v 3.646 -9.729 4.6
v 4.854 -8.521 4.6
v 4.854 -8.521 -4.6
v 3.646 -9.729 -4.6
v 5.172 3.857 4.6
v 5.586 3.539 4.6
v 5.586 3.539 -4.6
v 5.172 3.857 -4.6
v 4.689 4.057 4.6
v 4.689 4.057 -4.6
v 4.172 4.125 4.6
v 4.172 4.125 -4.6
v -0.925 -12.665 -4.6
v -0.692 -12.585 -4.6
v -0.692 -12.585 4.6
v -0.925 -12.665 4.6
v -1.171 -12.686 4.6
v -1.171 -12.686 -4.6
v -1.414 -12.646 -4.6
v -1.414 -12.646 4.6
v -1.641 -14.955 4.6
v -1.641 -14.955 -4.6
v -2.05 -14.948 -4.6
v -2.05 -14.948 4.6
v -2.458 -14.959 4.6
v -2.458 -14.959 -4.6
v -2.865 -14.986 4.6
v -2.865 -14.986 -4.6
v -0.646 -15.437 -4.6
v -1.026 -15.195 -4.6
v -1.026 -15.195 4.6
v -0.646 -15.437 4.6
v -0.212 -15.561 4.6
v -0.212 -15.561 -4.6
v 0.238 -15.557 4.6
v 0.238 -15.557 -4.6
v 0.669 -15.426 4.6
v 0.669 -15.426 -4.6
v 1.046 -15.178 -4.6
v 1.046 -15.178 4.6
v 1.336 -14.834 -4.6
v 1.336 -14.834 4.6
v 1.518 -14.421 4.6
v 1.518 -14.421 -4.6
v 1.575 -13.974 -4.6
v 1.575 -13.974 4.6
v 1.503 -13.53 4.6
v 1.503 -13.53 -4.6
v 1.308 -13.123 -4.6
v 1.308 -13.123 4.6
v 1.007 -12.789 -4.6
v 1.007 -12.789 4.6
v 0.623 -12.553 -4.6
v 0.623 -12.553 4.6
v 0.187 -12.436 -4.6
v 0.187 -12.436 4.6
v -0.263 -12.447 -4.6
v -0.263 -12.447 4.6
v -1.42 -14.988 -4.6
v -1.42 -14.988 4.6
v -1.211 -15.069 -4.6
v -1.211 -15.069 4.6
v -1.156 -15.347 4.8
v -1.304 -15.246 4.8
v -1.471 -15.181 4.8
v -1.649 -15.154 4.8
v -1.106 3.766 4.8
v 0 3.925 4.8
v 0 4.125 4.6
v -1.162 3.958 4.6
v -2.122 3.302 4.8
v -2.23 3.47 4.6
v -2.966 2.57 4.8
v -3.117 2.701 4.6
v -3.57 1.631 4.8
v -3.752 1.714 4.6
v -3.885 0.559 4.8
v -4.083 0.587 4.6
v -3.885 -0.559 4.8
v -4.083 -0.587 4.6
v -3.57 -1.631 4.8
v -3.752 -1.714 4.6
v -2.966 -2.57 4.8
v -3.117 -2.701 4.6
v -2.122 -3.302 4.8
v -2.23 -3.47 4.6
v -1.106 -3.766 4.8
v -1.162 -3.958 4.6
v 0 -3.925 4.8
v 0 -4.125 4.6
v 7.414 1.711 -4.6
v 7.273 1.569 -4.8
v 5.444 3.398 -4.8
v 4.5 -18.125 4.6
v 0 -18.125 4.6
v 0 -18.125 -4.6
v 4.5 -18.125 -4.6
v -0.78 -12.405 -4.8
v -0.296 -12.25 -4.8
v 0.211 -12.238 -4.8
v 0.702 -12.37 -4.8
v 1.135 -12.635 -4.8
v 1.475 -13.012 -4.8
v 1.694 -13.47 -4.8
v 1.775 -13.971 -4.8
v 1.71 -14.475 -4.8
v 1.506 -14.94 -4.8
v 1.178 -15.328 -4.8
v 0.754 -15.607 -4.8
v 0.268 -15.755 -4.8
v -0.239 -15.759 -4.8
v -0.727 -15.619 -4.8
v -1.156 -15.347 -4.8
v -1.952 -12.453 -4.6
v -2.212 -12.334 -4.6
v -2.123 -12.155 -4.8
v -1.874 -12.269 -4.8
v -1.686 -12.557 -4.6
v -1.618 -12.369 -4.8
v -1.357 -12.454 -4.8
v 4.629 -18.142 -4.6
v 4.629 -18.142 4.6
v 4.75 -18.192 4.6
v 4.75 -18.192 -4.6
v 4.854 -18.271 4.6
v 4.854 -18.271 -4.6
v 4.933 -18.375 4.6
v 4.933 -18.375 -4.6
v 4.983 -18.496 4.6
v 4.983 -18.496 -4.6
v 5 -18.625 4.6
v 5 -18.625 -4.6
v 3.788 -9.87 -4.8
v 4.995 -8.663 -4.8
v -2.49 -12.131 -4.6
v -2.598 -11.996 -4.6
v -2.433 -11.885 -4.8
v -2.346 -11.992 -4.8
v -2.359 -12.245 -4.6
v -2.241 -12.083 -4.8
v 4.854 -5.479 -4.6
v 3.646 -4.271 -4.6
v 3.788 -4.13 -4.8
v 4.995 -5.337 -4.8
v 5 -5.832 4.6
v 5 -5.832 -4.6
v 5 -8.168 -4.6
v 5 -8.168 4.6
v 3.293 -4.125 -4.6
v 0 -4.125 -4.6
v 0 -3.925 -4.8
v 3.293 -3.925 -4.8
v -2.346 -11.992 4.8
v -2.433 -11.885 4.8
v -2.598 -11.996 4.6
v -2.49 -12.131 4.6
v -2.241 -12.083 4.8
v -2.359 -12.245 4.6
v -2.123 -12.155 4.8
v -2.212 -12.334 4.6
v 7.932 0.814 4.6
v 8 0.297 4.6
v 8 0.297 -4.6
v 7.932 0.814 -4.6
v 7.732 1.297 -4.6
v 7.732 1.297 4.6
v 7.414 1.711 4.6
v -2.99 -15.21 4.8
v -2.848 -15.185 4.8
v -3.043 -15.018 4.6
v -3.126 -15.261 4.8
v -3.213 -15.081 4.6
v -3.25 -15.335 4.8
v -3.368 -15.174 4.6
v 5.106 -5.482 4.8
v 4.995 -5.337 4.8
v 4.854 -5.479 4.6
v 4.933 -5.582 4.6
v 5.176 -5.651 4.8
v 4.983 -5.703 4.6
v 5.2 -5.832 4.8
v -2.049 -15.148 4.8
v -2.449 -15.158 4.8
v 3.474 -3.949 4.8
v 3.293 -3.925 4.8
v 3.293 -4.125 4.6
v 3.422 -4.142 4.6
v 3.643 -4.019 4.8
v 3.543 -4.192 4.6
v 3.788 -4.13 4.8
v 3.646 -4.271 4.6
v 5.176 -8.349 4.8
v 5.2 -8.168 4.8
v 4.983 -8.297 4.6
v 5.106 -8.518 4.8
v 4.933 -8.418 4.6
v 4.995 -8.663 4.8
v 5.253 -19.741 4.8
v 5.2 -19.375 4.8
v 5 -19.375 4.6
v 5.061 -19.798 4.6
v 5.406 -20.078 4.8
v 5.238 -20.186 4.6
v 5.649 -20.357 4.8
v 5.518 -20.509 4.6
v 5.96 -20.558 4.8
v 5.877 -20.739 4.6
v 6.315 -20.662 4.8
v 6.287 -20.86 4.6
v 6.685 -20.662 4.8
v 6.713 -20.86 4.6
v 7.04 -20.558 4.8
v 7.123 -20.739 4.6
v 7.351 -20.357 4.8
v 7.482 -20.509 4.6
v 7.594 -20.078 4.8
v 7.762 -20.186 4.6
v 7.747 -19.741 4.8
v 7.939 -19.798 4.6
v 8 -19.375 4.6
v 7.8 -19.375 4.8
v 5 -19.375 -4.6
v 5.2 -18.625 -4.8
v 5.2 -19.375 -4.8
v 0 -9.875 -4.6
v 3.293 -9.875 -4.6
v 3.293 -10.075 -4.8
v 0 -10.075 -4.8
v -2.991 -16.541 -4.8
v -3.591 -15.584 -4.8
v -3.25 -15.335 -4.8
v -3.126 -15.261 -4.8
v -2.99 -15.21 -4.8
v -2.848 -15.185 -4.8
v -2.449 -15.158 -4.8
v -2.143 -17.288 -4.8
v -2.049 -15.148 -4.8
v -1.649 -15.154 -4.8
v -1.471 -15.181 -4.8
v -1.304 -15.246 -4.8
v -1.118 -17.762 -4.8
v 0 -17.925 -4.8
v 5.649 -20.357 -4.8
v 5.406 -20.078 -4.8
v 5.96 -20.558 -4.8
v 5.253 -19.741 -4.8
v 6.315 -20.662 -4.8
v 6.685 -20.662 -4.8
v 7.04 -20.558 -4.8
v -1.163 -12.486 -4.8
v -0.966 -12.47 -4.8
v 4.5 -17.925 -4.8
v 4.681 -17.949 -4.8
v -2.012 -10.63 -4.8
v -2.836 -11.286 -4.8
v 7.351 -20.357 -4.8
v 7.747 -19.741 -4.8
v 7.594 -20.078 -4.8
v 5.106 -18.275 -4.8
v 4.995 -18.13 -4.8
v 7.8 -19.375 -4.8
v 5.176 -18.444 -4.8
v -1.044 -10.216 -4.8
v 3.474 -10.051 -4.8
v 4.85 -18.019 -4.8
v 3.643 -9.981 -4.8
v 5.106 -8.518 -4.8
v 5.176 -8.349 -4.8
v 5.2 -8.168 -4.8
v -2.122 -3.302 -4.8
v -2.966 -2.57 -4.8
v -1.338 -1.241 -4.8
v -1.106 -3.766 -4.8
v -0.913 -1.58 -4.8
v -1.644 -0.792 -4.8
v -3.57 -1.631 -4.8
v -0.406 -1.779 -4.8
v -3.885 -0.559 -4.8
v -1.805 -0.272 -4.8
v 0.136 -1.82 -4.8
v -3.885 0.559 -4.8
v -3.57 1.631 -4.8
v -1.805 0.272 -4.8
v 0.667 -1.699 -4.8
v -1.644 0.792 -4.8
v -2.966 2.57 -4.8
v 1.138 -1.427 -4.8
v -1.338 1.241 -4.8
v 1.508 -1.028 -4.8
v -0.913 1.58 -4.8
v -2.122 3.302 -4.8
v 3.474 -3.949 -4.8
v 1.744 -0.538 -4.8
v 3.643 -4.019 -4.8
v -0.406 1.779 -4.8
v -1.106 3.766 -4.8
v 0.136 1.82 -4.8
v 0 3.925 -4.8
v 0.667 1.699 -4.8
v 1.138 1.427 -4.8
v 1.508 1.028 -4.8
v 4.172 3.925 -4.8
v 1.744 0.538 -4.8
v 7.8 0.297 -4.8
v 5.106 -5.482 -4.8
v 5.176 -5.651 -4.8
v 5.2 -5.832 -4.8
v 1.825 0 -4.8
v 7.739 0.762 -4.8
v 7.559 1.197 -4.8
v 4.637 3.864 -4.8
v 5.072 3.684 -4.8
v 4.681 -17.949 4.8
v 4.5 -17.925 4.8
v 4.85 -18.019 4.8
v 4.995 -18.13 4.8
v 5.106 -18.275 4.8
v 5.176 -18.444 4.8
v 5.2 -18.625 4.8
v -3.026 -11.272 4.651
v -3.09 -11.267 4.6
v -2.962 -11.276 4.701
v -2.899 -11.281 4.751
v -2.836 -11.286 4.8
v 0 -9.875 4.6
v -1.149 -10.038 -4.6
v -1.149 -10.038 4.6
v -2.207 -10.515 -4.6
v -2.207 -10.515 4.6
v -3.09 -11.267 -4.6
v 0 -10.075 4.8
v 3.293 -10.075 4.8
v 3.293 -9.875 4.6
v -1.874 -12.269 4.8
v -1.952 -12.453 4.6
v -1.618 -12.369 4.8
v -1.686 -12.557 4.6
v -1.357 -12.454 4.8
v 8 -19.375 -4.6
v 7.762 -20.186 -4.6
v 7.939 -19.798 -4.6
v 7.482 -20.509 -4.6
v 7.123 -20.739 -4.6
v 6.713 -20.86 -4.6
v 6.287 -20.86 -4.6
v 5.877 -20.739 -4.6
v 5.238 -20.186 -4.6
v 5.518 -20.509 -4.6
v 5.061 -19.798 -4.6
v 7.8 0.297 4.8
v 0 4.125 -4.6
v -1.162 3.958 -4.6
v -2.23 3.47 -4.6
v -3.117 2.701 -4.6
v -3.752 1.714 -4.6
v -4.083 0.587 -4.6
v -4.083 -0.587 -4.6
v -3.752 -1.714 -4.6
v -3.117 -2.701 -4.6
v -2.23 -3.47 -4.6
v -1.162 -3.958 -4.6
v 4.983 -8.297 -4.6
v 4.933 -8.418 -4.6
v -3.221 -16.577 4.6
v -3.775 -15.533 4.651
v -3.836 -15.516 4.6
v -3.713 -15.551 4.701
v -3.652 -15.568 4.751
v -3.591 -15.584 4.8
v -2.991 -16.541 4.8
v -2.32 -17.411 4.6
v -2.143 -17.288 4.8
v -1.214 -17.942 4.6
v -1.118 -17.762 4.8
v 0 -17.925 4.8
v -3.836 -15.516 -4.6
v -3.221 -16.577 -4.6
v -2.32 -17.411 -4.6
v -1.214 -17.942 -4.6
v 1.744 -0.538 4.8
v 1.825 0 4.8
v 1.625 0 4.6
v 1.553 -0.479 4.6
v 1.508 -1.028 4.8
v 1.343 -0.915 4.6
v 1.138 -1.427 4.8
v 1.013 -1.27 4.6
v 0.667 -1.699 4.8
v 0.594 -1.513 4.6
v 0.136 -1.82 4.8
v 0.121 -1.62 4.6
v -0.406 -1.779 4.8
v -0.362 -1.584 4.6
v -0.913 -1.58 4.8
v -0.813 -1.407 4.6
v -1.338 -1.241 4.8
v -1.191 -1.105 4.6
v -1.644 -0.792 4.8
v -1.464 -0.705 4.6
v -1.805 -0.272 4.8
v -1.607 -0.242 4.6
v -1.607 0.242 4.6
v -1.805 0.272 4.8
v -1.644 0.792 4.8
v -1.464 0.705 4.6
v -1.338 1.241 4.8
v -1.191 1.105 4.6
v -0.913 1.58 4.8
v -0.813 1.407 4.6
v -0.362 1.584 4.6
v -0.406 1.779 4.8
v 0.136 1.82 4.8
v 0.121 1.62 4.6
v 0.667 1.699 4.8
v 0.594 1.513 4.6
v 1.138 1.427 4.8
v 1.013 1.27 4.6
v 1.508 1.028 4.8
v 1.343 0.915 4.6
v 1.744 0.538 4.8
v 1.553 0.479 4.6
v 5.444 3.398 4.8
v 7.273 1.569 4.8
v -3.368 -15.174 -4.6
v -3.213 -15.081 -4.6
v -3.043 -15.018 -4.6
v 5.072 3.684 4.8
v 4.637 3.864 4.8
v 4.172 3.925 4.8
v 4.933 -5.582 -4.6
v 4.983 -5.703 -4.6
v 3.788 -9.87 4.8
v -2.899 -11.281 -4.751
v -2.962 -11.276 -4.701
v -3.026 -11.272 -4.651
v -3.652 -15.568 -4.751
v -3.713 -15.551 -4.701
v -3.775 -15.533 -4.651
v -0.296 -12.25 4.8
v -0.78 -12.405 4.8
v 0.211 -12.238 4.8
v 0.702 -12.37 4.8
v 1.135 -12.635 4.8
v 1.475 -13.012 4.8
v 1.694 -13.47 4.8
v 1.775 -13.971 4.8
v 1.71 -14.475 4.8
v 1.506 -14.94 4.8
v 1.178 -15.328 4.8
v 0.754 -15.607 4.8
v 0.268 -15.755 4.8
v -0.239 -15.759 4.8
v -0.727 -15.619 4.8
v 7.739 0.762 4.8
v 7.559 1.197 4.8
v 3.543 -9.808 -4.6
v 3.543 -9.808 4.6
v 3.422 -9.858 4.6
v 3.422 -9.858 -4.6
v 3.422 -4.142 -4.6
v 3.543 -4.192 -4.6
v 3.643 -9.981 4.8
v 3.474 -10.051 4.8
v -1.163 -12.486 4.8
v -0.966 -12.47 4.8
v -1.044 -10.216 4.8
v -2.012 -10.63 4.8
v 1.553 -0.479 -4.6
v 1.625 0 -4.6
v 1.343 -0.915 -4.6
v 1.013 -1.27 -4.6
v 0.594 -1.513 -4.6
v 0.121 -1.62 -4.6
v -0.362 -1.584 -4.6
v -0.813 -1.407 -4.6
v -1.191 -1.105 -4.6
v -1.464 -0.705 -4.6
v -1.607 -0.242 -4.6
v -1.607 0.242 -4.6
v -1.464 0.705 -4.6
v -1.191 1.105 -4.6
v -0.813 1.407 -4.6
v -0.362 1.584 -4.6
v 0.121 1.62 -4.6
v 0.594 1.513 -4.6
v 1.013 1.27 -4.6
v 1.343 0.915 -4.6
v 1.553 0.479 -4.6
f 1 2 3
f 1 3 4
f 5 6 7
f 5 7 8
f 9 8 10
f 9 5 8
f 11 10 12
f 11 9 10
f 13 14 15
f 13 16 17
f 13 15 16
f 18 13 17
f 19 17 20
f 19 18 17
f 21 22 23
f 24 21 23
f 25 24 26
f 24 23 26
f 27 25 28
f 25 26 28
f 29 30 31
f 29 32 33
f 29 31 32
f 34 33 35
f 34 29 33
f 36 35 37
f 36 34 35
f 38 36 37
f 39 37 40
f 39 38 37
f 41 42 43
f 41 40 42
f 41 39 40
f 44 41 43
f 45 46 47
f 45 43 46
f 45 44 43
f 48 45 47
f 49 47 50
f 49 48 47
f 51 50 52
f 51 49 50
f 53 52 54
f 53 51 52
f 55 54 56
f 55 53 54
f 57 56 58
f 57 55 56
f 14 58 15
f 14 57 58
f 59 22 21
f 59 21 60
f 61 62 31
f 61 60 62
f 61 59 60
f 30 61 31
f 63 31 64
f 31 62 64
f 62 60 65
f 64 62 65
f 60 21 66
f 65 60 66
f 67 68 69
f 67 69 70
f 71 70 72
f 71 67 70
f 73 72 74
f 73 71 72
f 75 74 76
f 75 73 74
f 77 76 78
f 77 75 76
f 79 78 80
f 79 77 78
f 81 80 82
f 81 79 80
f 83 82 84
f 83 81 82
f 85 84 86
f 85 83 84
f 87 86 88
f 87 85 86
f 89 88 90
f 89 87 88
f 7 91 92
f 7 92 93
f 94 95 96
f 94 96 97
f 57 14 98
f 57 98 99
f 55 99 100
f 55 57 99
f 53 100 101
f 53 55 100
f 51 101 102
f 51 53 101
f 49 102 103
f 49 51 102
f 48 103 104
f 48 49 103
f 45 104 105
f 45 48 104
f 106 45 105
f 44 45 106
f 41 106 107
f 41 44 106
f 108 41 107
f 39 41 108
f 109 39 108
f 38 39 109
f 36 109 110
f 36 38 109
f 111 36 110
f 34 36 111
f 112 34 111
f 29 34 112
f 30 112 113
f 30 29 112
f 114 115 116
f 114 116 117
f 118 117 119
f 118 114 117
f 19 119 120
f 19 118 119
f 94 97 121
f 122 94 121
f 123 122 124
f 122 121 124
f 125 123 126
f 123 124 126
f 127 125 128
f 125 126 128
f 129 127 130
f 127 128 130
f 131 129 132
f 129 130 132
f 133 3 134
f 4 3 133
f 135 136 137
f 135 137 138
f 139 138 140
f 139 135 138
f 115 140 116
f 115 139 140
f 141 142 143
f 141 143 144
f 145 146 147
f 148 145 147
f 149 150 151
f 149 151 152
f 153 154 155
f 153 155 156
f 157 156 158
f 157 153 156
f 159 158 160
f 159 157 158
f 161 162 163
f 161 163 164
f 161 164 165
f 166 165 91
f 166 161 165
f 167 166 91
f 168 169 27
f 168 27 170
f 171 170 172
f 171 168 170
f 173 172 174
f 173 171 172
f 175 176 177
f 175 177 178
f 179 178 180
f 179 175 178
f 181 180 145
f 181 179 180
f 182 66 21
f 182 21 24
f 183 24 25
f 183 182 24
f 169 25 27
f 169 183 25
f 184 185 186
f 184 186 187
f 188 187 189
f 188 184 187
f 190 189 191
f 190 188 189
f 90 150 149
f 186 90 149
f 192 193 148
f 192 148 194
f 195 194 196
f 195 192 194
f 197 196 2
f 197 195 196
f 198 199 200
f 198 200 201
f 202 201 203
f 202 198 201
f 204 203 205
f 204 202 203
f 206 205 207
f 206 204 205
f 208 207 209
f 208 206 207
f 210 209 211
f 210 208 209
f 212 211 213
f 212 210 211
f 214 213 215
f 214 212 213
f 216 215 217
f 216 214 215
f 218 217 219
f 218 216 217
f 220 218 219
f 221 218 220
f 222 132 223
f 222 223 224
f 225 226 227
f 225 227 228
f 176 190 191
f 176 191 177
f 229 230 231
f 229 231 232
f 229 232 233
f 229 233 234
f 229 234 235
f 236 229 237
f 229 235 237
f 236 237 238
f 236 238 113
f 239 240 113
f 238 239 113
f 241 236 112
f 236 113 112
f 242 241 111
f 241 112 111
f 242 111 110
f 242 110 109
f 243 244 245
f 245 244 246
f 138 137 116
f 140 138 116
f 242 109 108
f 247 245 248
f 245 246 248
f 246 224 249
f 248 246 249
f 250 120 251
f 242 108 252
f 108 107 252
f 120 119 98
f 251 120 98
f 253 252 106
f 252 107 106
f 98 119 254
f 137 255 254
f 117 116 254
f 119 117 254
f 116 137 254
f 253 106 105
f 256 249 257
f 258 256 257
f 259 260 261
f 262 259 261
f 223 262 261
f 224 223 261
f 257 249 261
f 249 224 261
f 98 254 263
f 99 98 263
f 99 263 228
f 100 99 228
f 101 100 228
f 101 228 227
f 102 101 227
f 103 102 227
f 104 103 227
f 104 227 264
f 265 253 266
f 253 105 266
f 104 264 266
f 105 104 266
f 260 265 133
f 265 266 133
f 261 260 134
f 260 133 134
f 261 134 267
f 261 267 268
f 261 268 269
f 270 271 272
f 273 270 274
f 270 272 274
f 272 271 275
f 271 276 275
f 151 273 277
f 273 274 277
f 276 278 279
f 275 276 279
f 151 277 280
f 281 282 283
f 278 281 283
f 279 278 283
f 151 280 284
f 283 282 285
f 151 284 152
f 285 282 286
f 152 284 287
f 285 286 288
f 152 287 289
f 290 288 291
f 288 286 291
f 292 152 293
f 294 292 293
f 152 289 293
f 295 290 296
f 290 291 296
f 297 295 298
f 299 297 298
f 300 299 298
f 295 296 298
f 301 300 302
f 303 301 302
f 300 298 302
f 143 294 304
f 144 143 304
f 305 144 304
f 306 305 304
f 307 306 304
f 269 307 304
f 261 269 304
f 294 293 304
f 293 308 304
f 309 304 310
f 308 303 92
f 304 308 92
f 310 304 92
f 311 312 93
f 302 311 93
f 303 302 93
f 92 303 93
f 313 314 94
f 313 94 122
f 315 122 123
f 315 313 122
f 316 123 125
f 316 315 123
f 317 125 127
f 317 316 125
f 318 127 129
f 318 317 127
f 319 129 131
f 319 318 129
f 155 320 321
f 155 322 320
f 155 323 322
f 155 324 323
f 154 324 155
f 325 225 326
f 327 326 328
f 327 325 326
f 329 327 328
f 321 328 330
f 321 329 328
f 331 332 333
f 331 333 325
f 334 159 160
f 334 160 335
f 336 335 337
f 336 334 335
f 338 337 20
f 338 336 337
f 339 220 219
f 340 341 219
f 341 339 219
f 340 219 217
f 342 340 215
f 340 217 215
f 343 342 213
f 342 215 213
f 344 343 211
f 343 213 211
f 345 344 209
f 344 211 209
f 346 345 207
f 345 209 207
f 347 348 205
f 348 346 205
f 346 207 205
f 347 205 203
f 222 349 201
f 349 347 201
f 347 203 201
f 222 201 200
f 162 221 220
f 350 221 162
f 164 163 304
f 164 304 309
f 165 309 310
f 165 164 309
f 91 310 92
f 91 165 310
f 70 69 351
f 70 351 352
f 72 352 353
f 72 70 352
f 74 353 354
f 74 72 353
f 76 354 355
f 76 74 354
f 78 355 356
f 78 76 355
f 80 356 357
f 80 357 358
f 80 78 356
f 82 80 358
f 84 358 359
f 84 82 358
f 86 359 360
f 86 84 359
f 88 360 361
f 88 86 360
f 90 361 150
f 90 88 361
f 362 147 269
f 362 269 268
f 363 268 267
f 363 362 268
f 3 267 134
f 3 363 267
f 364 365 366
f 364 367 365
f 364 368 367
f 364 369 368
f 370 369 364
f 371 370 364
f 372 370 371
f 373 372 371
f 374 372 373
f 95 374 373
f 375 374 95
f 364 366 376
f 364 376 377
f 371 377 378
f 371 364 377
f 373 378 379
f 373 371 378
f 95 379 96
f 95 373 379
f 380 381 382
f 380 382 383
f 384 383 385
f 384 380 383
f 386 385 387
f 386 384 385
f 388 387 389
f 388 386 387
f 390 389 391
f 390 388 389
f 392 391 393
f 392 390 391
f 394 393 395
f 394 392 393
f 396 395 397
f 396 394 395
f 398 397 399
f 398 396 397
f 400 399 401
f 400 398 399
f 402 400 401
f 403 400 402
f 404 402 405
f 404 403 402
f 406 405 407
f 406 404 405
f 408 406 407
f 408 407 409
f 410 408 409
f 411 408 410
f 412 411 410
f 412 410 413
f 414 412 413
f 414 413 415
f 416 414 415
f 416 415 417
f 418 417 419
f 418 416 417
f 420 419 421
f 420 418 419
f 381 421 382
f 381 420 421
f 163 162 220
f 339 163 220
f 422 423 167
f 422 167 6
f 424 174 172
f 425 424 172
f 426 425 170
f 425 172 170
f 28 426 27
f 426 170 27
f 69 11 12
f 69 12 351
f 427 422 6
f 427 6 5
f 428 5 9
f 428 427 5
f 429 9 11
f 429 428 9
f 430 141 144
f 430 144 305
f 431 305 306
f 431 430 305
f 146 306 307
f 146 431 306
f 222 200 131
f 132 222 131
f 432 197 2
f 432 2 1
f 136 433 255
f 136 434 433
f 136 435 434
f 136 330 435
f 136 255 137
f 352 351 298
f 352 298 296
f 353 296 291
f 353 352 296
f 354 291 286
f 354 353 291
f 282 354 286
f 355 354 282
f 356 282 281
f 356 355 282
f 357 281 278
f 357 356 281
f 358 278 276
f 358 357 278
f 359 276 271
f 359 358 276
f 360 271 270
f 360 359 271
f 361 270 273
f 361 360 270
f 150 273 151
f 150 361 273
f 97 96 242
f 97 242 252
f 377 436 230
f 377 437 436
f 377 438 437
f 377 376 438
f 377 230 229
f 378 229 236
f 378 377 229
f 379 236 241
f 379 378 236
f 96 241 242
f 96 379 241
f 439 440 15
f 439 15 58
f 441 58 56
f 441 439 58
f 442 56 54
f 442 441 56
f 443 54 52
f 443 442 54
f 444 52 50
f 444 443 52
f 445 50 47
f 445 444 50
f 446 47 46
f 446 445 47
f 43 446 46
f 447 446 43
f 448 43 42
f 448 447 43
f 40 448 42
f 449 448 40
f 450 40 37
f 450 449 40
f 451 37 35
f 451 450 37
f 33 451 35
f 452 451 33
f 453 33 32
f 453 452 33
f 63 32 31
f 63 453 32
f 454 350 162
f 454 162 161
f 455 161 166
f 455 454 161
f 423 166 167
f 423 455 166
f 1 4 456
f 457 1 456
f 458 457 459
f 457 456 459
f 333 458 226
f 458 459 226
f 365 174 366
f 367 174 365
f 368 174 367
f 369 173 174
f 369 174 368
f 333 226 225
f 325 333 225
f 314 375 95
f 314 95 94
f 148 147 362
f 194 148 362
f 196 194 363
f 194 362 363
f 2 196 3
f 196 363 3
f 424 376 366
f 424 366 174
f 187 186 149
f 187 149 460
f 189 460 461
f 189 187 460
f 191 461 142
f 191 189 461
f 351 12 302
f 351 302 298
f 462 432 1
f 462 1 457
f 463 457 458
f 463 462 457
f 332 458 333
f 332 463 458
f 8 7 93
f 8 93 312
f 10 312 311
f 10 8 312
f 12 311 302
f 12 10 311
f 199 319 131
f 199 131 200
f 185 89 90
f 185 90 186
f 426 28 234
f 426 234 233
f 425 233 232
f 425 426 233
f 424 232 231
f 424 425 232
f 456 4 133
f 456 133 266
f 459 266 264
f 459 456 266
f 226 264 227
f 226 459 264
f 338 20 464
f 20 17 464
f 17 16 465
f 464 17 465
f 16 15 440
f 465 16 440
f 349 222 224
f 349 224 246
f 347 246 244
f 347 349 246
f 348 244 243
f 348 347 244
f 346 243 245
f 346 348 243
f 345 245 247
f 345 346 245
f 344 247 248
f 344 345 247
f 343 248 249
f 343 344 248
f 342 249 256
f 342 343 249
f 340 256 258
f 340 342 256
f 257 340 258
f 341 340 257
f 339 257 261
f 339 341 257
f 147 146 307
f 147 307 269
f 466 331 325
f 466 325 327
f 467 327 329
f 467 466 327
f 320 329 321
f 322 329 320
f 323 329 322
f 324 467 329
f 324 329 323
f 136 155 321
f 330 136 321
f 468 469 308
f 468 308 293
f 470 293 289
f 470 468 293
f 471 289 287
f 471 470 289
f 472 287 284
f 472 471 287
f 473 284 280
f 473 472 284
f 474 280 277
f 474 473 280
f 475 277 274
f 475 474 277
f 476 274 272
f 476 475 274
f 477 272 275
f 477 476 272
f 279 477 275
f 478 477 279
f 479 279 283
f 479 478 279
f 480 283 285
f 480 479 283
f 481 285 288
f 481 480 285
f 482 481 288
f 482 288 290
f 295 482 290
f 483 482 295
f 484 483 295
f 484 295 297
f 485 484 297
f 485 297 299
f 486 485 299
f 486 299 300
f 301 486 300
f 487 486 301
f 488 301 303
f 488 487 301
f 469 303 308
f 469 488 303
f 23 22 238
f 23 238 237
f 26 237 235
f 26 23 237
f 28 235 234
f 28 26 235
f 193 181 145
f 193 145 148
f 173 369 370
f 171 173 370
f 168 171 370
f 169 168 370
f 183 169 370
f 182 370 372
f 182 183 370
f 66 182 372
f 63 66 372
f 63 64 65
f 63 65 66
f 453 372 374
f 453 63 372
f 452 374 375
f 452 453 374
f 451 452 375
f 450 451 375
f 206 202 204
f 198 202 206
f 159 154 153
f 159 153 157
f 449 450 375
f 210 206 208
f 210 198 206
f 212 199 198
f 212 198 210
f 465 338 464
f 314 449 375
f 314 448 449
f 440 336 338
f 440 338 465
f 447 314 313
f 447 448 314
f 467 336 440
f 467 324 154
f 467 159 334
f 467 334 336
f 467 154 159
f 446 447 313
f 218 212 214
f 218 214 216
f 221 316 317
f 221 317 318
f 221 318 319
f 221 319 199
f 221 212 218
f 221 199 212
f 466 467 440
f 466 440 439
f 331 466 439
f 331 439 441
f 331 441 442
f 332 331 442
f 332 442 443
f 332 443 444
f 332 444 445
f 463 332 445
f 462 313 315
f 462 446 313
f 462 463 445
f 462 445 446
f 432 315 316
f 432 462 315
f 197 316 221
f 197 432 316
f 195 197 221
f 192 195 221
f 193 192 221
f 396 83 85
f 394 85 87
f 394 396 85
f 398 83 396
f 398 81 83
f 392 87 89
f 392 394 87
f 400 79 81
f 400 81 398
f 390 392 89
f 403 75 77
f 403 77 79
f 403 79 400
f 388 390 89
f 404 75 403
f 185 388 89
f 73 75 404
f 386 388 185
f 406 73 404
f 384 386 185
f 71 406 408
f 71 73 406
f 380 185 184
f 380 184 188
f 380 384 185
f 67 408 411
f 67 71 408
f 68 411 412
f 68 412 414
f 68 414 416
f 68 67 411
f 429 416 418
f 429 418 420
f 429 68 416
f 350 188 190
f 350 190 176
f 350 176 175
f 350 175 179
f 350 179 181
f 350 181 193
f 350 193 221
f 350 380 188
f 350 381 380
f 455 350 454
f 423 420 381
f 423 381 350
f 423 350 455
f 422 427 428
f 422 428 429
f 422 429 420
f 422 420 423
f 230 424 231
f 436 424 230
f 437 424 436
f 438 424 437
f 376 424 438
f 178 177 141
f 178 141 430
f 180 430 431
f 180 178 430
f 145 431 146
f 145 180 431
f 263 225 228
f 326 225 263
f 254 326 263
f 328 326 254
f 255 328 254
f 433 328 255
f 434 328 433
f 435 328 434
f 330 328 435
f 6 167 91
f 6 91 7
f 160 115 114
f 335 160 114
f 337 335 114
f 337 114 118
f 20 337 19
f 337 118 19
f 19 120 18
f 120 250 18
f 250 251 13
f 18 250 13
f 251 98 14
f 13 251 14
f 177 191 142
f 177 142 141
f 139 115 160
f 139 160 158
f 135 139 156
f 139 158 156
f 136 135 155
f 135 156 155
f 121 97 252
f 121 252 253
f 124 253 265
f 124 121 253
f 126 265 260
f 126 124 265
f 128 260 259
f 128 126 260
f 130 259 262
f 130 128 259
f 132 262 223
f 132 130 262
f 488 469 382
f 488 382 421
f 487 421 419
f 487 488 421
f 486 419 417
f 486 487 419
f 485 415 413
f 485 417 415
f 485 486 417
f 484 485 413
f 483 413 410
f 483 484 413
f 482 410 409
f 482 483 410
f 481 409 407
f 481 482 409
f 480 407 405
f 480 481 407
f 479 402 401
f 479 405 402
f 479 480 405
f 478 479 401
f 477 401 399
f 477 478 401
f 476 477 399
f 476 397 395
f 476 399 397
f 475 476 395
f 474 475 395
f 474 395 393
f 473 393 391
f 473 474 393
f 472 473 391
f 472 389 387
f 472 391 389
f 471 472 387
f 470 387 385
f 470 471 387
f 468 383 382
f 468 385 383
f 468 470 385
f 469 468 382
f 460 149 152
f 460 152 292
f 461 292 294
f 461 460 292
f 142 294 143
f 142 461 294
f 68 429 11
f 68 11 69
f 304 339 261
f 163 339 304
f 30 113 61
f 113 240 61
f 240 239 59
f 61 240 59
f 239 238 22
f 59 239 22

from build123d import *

# Parameters (mm, degrees)
SKETCH2_R                         = 1.575
SKETCH2_R_2                       = 1.625
BOSS_EXTRUDE1_DEPTH               = 5
LATCH_NOTCH_DEPTH                 = 21.433199089
LATCH_NOTCH_DEPTH_BACK            = 21.433199089
FILLET2_R                         = 1
THUMB_BUMP_LONG_REACH             = 22.433
THUMB_BUMP_LONG_DIRECTION_2_REACH = 22.433
FILLET6_R                         = 0.5
MOVEMENT_CLEARANCE_DEPTH          = 0.2
FILLET3_R                         = 2
FILLET4_R                         = 0.5
CHAMFER2_SIZE                     = 0.2


with BuildPart() as part:
    # Sketch2 → Boss-Extrude1 (new, symmetric)
    with BuildSketch(Plane.XY):
        with BuildLine():
            Line((8, -15.125), (8, 1.125))
            Line((8, 1.125), (5, 4.125))
            Line((5, 4.125), (0, 4.125))
            ThreePointArc((0, 4.125), (-4.125, 0), (0, -4.125))
            Line((0, -4.125), (3.5, -4.125))
            Line((3.5, -4.125), (5, -5.625))
            Line((5, -5.625), (5, -8.375))
            Line((5, -8.375), (3.5, -9.875))
            Line((3.5, -9.875), (0, -9.875))
            ThreePointArc((0, -9.875), (-4.125, -14), (0, -18.125))
            Line((0, -18.125), (5, -18.125))
            Line((5, -18.125), (8, -15.125))
        make_face()
        with Locations((0, -14)):
            Circle(SKETCH2_R, mode=Mode.SUBTRACT)
        Circle(SKETCH2_R_2, mode=Mode.SUBTRACT)
    extrude(amount=BOSS_EXTRUDE1_DEPTH, both=True)

    # Sketch3 → Latch Notch (cut, two sides: drawn at the far end of the back side and taken through both)
    with BuildSketch(Plane.XY.offset(-LATCH_NOTCH_DEPTH_BACK)):
        with BuildLine():
            Line((-5.189425986, -13.053442339), (-4.352006159, -10.311715335))
            ThreePointArc((-4.352006159, -10.311715335), (-2.519069602, -12.169061048), (0, -12.85))
            Line((0, -12.85), (0, -15.15))
            ThreePointArc((0, -15.15), (-3.063481939, -15.004958499), (-6.026845813, -15.795169343))
            Line((-6.026845813, -15.795169343), (-5.189425986, -13.053442339))
        make_face()
    extrude(amount=LATCH_NOTCH_DEPTH + LATCH_NOTCH_DEPTH_BACK, mode=Mode.SUBTRACT)

    # Chamfer1
    # the kernel refuses this chamfer: 1.535901437, 0.897551306, 0.4 mm, written as the material it takes off along each edge
    with BuildSketch(Plane(origin=(-3.336286816, -11.574136179, -7.844626154), x_dir=(0.8125376228226495, -0.5829087505756949, 0), z_dir=(0, 0, 1))) as chamfer1_piece_1:
        with BuildLine():
            Line((1.080053984, 0), (0.021291111, 0.393036797))
            ThreePointArc((0.021291111, 0.393036797), (0.006455038, 0.205821568), (0, 0))
            ThreePointArc((0, 0), (0.568931585, -0.029164914), (1.080053984, 0))
        make_face()
    extrude(amount=15.689252309, mode=Mode.SUBTRACT)
    with BuildSketch(Plane(origin=(-3.96348247, -15.142992437, -7.141629453), x_dir=(0.3226160511275448, -0.9465299168831746, 0), z_dir=(0, 0, 1))) as chamfer1_piece_2:
        with BuildLine():
            Line((0.393613053, 0), (0.141125799, 0.8123737))
            ThreePointArc((0.141125799, 0.8123737), (0.064933685, 0.423381867), (0, 0))
            ThreePointArc((0, 0), (0.202118313, -0.004694141), (0.393613053, 0))
        make_face()
    extrude(amount=14.283258906, mode=Mode.SUBTRACT)

    # Fillet2
    fillet2_edges = [part.edges().sort_by_distance(p)[0] for p in [
        (-1.235054025, -14.977377387, 0),
        (-0.965763736, -12.755843496, 0),
        (-3.149017011, -15.014487433, 0),
        (-2.45870232, -12.203709097, 0),
    ]]
    fillet(fillet2_edges, radius=FILLET2_R)

    # Thumb Bump LONG: up to this face of the body (flat: up to its plane)
    thumb_bump_long_end = Plane(part.part.faces().sort_by_distance((-2.247358014, -15.204704165, 5))[0])
    # Sketch6 → Thumb Bump LONG (add, up to the picked face)
    with BuildSketch(Plane.XY, mode=Mode.PRIVATE) as thumb_bump_long_sk1:
        with BuildLine():
            Line((8, -15.125), (8, -19.375))
            ThreePointArc((8, -19.375), (6.5, -20.875), (5, -19.375))
            Line((5, -19.375), (5, -18.125))
            Line((5, -18.125), (8, -15.125))
        make_face()
    thumb_bump_long_tool1 = split(extrude(thumb_bump_long_sk1.sketch, amount=THUMB_BUMP_LONG_REACH, mode=Mode.PRIVATE), bisect_by=thumb_bump_long_end, keep=Keep.BOTH, mode=Mode.PRIVATE)
    add(thumb_bump_long_tool1.solids().sort_by(Axis((6.690932, -18.50785, 0), (0, 0, 1)))[0])

    # Thumb Bump LONG direction 2: up to this face of the body (flat: up to its plane)
    thumb_bump_long_direction_2_end = Plane(part.part.faces().sort_by_distance((-2.247358014, -15.204704165, -5))[0])
    # Sketch6 → Thumb Bump LONG direction 2 (add, up to the picked face)
    with BuildSketch(Plane.XY, mode=Mode.PRIVATE) as thumb_bump_long_direction_2_sk1:
        with BuildLine():
            Line((8, -15.125), (8, -19.375))
            ThreePointArc((8, -19.375), (6.5, -20.875), (5, -19.375))
            Line((5, -19.375), (5, -18.125))
            Line((5, -18.125), (8, -15.125))
        make_face()
    thumb_bump_long_direction_2_tool1 = split(extrude(thumb_bump_long_direction_2_sk1.sketch, amount=-THUMB_BUMP_LONG_DIRECTION_2_REACH, mode=Mode.PRIVATE), bisect_by=thumb_bump_long_direction_2_end, keep=Keep.BOTH, mode=Mode.PRIVATE)
    add(thumb_bump_long_direction_2_tool1.solids().sort_by(Axis((6.690932, -18.50785, 0), (0, 0, -1)))[0])

    # Fillet6
    fillet6_edges = [part.edges().sort_by_distance(p)[0] for p in [
        (5, -18.125, 0),
    ]]
    fillet(fillet6_edges, radius=FILLET6_R)

    # Sketch5 → Movement Clearance (cut)
    with BuildSketch(Plane.XY.offset(5)):
        with BuildLine():
            Line((-3.367662745, -15.173848028), (-3.836496581, -15.515558967))
            ThreePointArc((-3.836496581, -15.515558967), (-2.319907785, -17.410814107), (0, -18.125))
            Line((0, -18.125), (4.5, -18.125))
            ThreePointArc((4.5, -18.125), (4.853553391, -18.271446609), (5, -18.625))
            Line((5, -18.625), (5, -19.375))
            ThreePointArc((5, -19.375), (6.5, -20.875), (8, -19.375))
            Line((8, -19.375), (8, 1.125))
            Line((8, 1.125), (5, 4.125))
            Line((5, 4.125), (0, 4.125))
            ThreePointArc((0, 4.125), (-4.125, 0), (0, -4.125))
            Line((0, -4.125), (3.5, -4.125))
            Line((3.5, -4.125), (5, -5.625))
            Line((5, -5.625), (5, -8.375))
            Line((5, -8.375), (3.5, -9.875))
            Line((3.5, -9.875), (0, -9.875))
            ThreePointArc((0, -9.875), (-1.694518043, -10.239117976), (-3.089882399, -11.267189769))
            Line((-3.089882399, -11.267189769), (-2.598457721, -11.996345718))
            ThreePointArc((-2.598457721, -11.996345718), (-2.427061693, -12.190611517), (-2.211513476, -12.334329174))
            ThreePointArc((-2.211513476, -12.334329174), (-1.819392443, -12.507232133), (-1.413905836, -12.645922256))
            ThreePointArc((-1.413905836, -12.645922256), (-1.047175867, -12.683207874), (-0.691852953, -12.585092055))
            ThreePointArc((-0.691852953, -12.585092055), (1.562261425, -14.19991058), (-1.025836674, -15.195108412))
            ThreePointArc((-1.025836674, -15.195108412), (-1.313167774, -15.022506023), (-1.641393845, -14.954547274))
            ThreePointArc((-1.641393845, -14.954547274), (-2.253812991, -14.951393788), (-2.865276684, -14.985734846))
            ThreePointArc((-2.865276684, -14.985734846), (-3.129319301, -15.04547458), (-3.367662745, -15.173848028))
        make_face()
    movement_clearance = extrude(amount=-MOVEMENT_CLEARANCE_DEPTH, mode=Mode.SUBTRACT)

    # Movement Clearance 2: Movement Clearance across plane
    add(movement_clearance.mirror(Plane.XY), mode=Mode.SUBTRACT)

    # Fillet3
    fillet3_edges = [part.edges().sort_by_distance(p)[0] for p in [
        (5, 4.125, 0),
        (8, 1.125, 0),
    ]]
    fillet(fillet3_edges, radius=FILLET3_R)

    # Fillet4
    fillet4_edges = [part.edges().sort_by_distance(p)[0] for p in [
        (3.5, -9.875, 0),
        (5, -8.375, 0),
        (5, -5.625, 0),
        (3.5, -4.125, 0),
    ]]
    fillet(fillet4_edges, radius=FILLET4_R)

    # Chamfer2
    chamfer2_edges = [part.edges().sort_by_distance(p)[0] for p in [
        (-2.319907785, -17.410814107, 4.8),
        (-3.602079663, -15.344703498, 4.8),
        (-3.129319301, -15.04547458, 4.8),
        (-2.253812991, -14.951393788, 4.8),
        (-1.313167774, -15.022506023, 4.8),
        (1.562261425, -14.19991058, 4.8),
        (-1.047175867, -12.683207874, 4.8),
        (-1.819392443, -12.507232133, 4.8),
        (-2.427061693, -12.190611517, 4.8),
        (-2.84417006, -11.631767743, 4.8),
        (-1.694518043, -10.239117976, 4.8),
        (1.646446609, -4.125, 4.8),
        (-4.125, 0, 4.8),
        (8, -9.539213562, 4.8),
        (6.5, -20.875, 4.8),
        (5, -19, 4.8),
        (4.853553391, -18.271446609, 4.8),
        (2.25, -18.125, 4.8),
        (-1.625, 0, 4.8),
        (-1.625, 0, -4.8),
        (-2.319907785, -17.410814107, -4.8),
        (2.25, -18.125, -4.8),
        (4.853553391, -18.271446609, -4.8),
        (5, -19, -4.8),
        (6.5, -20.875, -4.8),
        (8, -9.539213562, -4.8),
        (-4.125, 0, -4.8),
        (1.646446609, -4.125, -4.8),
        (-1.694518043, -10.239117976, -4.8),
        (-2.84417006, -11.631767743, -4.8),
        (-2.427061693, -12.190611517, -4.8),
        (-1.819392443, -12.507232133, -4.8),
        (-1.047175867, -12.683207874, -4.8),
        (1.562261425, -14.19991058, -4.8),
        (-1.313167774, -15.022506023, -4.8),
        (-2.253812991, -14.951393788, -4.8),
        (-3.129319301, -15.04547458, -4.8),
        (-3.602079663, -15.344703498, -4.8),
        (6.5, 2.625, -4.8),
        (6.5, 2.625, 4.8),
        (2.085786438, 4.125, -4.8),
        (4.93693974, 3.972759065, -4.8),
        (7.847759065, 1.06193974, -4.8),
        (2.085786438, 4.125, 4.8),
        (4.93693974, 3.972759065, 4.8),
        (7.847759065, 1.06193974, 4.8),
        (1.646446609, -9.875, -4.8),
        (1.646446609, -9.875, 4.8),
        (4.25, -9.125, -4.8),
        (4.25, -9.125, 4.8),
        (5, -7, -4.8),
        (5, -7, 4.8),
        (4.25, -4.875, -4.8),
        (4.25, -4.875, 4.8),
        (3.484234935, -9.836939766, -4.8),
        (3.484234935, -9.836939766, 4.8),
        (4.961939766, -8.359234935, -4.8),
        (4.961939766, -8.359234935, 4.8),
        (4.961939766, -5.640765065, -4.8),
        (4.961939766, -5.640765065, 4.8),
        (3.484234935, -4.163060234, -4.8),
        (3.484234935, -4.163060234, 4.8),
    ]]
    chamfer(chamfer2_edges, length=CHAMFER2_SIZE)


solid = part.part
